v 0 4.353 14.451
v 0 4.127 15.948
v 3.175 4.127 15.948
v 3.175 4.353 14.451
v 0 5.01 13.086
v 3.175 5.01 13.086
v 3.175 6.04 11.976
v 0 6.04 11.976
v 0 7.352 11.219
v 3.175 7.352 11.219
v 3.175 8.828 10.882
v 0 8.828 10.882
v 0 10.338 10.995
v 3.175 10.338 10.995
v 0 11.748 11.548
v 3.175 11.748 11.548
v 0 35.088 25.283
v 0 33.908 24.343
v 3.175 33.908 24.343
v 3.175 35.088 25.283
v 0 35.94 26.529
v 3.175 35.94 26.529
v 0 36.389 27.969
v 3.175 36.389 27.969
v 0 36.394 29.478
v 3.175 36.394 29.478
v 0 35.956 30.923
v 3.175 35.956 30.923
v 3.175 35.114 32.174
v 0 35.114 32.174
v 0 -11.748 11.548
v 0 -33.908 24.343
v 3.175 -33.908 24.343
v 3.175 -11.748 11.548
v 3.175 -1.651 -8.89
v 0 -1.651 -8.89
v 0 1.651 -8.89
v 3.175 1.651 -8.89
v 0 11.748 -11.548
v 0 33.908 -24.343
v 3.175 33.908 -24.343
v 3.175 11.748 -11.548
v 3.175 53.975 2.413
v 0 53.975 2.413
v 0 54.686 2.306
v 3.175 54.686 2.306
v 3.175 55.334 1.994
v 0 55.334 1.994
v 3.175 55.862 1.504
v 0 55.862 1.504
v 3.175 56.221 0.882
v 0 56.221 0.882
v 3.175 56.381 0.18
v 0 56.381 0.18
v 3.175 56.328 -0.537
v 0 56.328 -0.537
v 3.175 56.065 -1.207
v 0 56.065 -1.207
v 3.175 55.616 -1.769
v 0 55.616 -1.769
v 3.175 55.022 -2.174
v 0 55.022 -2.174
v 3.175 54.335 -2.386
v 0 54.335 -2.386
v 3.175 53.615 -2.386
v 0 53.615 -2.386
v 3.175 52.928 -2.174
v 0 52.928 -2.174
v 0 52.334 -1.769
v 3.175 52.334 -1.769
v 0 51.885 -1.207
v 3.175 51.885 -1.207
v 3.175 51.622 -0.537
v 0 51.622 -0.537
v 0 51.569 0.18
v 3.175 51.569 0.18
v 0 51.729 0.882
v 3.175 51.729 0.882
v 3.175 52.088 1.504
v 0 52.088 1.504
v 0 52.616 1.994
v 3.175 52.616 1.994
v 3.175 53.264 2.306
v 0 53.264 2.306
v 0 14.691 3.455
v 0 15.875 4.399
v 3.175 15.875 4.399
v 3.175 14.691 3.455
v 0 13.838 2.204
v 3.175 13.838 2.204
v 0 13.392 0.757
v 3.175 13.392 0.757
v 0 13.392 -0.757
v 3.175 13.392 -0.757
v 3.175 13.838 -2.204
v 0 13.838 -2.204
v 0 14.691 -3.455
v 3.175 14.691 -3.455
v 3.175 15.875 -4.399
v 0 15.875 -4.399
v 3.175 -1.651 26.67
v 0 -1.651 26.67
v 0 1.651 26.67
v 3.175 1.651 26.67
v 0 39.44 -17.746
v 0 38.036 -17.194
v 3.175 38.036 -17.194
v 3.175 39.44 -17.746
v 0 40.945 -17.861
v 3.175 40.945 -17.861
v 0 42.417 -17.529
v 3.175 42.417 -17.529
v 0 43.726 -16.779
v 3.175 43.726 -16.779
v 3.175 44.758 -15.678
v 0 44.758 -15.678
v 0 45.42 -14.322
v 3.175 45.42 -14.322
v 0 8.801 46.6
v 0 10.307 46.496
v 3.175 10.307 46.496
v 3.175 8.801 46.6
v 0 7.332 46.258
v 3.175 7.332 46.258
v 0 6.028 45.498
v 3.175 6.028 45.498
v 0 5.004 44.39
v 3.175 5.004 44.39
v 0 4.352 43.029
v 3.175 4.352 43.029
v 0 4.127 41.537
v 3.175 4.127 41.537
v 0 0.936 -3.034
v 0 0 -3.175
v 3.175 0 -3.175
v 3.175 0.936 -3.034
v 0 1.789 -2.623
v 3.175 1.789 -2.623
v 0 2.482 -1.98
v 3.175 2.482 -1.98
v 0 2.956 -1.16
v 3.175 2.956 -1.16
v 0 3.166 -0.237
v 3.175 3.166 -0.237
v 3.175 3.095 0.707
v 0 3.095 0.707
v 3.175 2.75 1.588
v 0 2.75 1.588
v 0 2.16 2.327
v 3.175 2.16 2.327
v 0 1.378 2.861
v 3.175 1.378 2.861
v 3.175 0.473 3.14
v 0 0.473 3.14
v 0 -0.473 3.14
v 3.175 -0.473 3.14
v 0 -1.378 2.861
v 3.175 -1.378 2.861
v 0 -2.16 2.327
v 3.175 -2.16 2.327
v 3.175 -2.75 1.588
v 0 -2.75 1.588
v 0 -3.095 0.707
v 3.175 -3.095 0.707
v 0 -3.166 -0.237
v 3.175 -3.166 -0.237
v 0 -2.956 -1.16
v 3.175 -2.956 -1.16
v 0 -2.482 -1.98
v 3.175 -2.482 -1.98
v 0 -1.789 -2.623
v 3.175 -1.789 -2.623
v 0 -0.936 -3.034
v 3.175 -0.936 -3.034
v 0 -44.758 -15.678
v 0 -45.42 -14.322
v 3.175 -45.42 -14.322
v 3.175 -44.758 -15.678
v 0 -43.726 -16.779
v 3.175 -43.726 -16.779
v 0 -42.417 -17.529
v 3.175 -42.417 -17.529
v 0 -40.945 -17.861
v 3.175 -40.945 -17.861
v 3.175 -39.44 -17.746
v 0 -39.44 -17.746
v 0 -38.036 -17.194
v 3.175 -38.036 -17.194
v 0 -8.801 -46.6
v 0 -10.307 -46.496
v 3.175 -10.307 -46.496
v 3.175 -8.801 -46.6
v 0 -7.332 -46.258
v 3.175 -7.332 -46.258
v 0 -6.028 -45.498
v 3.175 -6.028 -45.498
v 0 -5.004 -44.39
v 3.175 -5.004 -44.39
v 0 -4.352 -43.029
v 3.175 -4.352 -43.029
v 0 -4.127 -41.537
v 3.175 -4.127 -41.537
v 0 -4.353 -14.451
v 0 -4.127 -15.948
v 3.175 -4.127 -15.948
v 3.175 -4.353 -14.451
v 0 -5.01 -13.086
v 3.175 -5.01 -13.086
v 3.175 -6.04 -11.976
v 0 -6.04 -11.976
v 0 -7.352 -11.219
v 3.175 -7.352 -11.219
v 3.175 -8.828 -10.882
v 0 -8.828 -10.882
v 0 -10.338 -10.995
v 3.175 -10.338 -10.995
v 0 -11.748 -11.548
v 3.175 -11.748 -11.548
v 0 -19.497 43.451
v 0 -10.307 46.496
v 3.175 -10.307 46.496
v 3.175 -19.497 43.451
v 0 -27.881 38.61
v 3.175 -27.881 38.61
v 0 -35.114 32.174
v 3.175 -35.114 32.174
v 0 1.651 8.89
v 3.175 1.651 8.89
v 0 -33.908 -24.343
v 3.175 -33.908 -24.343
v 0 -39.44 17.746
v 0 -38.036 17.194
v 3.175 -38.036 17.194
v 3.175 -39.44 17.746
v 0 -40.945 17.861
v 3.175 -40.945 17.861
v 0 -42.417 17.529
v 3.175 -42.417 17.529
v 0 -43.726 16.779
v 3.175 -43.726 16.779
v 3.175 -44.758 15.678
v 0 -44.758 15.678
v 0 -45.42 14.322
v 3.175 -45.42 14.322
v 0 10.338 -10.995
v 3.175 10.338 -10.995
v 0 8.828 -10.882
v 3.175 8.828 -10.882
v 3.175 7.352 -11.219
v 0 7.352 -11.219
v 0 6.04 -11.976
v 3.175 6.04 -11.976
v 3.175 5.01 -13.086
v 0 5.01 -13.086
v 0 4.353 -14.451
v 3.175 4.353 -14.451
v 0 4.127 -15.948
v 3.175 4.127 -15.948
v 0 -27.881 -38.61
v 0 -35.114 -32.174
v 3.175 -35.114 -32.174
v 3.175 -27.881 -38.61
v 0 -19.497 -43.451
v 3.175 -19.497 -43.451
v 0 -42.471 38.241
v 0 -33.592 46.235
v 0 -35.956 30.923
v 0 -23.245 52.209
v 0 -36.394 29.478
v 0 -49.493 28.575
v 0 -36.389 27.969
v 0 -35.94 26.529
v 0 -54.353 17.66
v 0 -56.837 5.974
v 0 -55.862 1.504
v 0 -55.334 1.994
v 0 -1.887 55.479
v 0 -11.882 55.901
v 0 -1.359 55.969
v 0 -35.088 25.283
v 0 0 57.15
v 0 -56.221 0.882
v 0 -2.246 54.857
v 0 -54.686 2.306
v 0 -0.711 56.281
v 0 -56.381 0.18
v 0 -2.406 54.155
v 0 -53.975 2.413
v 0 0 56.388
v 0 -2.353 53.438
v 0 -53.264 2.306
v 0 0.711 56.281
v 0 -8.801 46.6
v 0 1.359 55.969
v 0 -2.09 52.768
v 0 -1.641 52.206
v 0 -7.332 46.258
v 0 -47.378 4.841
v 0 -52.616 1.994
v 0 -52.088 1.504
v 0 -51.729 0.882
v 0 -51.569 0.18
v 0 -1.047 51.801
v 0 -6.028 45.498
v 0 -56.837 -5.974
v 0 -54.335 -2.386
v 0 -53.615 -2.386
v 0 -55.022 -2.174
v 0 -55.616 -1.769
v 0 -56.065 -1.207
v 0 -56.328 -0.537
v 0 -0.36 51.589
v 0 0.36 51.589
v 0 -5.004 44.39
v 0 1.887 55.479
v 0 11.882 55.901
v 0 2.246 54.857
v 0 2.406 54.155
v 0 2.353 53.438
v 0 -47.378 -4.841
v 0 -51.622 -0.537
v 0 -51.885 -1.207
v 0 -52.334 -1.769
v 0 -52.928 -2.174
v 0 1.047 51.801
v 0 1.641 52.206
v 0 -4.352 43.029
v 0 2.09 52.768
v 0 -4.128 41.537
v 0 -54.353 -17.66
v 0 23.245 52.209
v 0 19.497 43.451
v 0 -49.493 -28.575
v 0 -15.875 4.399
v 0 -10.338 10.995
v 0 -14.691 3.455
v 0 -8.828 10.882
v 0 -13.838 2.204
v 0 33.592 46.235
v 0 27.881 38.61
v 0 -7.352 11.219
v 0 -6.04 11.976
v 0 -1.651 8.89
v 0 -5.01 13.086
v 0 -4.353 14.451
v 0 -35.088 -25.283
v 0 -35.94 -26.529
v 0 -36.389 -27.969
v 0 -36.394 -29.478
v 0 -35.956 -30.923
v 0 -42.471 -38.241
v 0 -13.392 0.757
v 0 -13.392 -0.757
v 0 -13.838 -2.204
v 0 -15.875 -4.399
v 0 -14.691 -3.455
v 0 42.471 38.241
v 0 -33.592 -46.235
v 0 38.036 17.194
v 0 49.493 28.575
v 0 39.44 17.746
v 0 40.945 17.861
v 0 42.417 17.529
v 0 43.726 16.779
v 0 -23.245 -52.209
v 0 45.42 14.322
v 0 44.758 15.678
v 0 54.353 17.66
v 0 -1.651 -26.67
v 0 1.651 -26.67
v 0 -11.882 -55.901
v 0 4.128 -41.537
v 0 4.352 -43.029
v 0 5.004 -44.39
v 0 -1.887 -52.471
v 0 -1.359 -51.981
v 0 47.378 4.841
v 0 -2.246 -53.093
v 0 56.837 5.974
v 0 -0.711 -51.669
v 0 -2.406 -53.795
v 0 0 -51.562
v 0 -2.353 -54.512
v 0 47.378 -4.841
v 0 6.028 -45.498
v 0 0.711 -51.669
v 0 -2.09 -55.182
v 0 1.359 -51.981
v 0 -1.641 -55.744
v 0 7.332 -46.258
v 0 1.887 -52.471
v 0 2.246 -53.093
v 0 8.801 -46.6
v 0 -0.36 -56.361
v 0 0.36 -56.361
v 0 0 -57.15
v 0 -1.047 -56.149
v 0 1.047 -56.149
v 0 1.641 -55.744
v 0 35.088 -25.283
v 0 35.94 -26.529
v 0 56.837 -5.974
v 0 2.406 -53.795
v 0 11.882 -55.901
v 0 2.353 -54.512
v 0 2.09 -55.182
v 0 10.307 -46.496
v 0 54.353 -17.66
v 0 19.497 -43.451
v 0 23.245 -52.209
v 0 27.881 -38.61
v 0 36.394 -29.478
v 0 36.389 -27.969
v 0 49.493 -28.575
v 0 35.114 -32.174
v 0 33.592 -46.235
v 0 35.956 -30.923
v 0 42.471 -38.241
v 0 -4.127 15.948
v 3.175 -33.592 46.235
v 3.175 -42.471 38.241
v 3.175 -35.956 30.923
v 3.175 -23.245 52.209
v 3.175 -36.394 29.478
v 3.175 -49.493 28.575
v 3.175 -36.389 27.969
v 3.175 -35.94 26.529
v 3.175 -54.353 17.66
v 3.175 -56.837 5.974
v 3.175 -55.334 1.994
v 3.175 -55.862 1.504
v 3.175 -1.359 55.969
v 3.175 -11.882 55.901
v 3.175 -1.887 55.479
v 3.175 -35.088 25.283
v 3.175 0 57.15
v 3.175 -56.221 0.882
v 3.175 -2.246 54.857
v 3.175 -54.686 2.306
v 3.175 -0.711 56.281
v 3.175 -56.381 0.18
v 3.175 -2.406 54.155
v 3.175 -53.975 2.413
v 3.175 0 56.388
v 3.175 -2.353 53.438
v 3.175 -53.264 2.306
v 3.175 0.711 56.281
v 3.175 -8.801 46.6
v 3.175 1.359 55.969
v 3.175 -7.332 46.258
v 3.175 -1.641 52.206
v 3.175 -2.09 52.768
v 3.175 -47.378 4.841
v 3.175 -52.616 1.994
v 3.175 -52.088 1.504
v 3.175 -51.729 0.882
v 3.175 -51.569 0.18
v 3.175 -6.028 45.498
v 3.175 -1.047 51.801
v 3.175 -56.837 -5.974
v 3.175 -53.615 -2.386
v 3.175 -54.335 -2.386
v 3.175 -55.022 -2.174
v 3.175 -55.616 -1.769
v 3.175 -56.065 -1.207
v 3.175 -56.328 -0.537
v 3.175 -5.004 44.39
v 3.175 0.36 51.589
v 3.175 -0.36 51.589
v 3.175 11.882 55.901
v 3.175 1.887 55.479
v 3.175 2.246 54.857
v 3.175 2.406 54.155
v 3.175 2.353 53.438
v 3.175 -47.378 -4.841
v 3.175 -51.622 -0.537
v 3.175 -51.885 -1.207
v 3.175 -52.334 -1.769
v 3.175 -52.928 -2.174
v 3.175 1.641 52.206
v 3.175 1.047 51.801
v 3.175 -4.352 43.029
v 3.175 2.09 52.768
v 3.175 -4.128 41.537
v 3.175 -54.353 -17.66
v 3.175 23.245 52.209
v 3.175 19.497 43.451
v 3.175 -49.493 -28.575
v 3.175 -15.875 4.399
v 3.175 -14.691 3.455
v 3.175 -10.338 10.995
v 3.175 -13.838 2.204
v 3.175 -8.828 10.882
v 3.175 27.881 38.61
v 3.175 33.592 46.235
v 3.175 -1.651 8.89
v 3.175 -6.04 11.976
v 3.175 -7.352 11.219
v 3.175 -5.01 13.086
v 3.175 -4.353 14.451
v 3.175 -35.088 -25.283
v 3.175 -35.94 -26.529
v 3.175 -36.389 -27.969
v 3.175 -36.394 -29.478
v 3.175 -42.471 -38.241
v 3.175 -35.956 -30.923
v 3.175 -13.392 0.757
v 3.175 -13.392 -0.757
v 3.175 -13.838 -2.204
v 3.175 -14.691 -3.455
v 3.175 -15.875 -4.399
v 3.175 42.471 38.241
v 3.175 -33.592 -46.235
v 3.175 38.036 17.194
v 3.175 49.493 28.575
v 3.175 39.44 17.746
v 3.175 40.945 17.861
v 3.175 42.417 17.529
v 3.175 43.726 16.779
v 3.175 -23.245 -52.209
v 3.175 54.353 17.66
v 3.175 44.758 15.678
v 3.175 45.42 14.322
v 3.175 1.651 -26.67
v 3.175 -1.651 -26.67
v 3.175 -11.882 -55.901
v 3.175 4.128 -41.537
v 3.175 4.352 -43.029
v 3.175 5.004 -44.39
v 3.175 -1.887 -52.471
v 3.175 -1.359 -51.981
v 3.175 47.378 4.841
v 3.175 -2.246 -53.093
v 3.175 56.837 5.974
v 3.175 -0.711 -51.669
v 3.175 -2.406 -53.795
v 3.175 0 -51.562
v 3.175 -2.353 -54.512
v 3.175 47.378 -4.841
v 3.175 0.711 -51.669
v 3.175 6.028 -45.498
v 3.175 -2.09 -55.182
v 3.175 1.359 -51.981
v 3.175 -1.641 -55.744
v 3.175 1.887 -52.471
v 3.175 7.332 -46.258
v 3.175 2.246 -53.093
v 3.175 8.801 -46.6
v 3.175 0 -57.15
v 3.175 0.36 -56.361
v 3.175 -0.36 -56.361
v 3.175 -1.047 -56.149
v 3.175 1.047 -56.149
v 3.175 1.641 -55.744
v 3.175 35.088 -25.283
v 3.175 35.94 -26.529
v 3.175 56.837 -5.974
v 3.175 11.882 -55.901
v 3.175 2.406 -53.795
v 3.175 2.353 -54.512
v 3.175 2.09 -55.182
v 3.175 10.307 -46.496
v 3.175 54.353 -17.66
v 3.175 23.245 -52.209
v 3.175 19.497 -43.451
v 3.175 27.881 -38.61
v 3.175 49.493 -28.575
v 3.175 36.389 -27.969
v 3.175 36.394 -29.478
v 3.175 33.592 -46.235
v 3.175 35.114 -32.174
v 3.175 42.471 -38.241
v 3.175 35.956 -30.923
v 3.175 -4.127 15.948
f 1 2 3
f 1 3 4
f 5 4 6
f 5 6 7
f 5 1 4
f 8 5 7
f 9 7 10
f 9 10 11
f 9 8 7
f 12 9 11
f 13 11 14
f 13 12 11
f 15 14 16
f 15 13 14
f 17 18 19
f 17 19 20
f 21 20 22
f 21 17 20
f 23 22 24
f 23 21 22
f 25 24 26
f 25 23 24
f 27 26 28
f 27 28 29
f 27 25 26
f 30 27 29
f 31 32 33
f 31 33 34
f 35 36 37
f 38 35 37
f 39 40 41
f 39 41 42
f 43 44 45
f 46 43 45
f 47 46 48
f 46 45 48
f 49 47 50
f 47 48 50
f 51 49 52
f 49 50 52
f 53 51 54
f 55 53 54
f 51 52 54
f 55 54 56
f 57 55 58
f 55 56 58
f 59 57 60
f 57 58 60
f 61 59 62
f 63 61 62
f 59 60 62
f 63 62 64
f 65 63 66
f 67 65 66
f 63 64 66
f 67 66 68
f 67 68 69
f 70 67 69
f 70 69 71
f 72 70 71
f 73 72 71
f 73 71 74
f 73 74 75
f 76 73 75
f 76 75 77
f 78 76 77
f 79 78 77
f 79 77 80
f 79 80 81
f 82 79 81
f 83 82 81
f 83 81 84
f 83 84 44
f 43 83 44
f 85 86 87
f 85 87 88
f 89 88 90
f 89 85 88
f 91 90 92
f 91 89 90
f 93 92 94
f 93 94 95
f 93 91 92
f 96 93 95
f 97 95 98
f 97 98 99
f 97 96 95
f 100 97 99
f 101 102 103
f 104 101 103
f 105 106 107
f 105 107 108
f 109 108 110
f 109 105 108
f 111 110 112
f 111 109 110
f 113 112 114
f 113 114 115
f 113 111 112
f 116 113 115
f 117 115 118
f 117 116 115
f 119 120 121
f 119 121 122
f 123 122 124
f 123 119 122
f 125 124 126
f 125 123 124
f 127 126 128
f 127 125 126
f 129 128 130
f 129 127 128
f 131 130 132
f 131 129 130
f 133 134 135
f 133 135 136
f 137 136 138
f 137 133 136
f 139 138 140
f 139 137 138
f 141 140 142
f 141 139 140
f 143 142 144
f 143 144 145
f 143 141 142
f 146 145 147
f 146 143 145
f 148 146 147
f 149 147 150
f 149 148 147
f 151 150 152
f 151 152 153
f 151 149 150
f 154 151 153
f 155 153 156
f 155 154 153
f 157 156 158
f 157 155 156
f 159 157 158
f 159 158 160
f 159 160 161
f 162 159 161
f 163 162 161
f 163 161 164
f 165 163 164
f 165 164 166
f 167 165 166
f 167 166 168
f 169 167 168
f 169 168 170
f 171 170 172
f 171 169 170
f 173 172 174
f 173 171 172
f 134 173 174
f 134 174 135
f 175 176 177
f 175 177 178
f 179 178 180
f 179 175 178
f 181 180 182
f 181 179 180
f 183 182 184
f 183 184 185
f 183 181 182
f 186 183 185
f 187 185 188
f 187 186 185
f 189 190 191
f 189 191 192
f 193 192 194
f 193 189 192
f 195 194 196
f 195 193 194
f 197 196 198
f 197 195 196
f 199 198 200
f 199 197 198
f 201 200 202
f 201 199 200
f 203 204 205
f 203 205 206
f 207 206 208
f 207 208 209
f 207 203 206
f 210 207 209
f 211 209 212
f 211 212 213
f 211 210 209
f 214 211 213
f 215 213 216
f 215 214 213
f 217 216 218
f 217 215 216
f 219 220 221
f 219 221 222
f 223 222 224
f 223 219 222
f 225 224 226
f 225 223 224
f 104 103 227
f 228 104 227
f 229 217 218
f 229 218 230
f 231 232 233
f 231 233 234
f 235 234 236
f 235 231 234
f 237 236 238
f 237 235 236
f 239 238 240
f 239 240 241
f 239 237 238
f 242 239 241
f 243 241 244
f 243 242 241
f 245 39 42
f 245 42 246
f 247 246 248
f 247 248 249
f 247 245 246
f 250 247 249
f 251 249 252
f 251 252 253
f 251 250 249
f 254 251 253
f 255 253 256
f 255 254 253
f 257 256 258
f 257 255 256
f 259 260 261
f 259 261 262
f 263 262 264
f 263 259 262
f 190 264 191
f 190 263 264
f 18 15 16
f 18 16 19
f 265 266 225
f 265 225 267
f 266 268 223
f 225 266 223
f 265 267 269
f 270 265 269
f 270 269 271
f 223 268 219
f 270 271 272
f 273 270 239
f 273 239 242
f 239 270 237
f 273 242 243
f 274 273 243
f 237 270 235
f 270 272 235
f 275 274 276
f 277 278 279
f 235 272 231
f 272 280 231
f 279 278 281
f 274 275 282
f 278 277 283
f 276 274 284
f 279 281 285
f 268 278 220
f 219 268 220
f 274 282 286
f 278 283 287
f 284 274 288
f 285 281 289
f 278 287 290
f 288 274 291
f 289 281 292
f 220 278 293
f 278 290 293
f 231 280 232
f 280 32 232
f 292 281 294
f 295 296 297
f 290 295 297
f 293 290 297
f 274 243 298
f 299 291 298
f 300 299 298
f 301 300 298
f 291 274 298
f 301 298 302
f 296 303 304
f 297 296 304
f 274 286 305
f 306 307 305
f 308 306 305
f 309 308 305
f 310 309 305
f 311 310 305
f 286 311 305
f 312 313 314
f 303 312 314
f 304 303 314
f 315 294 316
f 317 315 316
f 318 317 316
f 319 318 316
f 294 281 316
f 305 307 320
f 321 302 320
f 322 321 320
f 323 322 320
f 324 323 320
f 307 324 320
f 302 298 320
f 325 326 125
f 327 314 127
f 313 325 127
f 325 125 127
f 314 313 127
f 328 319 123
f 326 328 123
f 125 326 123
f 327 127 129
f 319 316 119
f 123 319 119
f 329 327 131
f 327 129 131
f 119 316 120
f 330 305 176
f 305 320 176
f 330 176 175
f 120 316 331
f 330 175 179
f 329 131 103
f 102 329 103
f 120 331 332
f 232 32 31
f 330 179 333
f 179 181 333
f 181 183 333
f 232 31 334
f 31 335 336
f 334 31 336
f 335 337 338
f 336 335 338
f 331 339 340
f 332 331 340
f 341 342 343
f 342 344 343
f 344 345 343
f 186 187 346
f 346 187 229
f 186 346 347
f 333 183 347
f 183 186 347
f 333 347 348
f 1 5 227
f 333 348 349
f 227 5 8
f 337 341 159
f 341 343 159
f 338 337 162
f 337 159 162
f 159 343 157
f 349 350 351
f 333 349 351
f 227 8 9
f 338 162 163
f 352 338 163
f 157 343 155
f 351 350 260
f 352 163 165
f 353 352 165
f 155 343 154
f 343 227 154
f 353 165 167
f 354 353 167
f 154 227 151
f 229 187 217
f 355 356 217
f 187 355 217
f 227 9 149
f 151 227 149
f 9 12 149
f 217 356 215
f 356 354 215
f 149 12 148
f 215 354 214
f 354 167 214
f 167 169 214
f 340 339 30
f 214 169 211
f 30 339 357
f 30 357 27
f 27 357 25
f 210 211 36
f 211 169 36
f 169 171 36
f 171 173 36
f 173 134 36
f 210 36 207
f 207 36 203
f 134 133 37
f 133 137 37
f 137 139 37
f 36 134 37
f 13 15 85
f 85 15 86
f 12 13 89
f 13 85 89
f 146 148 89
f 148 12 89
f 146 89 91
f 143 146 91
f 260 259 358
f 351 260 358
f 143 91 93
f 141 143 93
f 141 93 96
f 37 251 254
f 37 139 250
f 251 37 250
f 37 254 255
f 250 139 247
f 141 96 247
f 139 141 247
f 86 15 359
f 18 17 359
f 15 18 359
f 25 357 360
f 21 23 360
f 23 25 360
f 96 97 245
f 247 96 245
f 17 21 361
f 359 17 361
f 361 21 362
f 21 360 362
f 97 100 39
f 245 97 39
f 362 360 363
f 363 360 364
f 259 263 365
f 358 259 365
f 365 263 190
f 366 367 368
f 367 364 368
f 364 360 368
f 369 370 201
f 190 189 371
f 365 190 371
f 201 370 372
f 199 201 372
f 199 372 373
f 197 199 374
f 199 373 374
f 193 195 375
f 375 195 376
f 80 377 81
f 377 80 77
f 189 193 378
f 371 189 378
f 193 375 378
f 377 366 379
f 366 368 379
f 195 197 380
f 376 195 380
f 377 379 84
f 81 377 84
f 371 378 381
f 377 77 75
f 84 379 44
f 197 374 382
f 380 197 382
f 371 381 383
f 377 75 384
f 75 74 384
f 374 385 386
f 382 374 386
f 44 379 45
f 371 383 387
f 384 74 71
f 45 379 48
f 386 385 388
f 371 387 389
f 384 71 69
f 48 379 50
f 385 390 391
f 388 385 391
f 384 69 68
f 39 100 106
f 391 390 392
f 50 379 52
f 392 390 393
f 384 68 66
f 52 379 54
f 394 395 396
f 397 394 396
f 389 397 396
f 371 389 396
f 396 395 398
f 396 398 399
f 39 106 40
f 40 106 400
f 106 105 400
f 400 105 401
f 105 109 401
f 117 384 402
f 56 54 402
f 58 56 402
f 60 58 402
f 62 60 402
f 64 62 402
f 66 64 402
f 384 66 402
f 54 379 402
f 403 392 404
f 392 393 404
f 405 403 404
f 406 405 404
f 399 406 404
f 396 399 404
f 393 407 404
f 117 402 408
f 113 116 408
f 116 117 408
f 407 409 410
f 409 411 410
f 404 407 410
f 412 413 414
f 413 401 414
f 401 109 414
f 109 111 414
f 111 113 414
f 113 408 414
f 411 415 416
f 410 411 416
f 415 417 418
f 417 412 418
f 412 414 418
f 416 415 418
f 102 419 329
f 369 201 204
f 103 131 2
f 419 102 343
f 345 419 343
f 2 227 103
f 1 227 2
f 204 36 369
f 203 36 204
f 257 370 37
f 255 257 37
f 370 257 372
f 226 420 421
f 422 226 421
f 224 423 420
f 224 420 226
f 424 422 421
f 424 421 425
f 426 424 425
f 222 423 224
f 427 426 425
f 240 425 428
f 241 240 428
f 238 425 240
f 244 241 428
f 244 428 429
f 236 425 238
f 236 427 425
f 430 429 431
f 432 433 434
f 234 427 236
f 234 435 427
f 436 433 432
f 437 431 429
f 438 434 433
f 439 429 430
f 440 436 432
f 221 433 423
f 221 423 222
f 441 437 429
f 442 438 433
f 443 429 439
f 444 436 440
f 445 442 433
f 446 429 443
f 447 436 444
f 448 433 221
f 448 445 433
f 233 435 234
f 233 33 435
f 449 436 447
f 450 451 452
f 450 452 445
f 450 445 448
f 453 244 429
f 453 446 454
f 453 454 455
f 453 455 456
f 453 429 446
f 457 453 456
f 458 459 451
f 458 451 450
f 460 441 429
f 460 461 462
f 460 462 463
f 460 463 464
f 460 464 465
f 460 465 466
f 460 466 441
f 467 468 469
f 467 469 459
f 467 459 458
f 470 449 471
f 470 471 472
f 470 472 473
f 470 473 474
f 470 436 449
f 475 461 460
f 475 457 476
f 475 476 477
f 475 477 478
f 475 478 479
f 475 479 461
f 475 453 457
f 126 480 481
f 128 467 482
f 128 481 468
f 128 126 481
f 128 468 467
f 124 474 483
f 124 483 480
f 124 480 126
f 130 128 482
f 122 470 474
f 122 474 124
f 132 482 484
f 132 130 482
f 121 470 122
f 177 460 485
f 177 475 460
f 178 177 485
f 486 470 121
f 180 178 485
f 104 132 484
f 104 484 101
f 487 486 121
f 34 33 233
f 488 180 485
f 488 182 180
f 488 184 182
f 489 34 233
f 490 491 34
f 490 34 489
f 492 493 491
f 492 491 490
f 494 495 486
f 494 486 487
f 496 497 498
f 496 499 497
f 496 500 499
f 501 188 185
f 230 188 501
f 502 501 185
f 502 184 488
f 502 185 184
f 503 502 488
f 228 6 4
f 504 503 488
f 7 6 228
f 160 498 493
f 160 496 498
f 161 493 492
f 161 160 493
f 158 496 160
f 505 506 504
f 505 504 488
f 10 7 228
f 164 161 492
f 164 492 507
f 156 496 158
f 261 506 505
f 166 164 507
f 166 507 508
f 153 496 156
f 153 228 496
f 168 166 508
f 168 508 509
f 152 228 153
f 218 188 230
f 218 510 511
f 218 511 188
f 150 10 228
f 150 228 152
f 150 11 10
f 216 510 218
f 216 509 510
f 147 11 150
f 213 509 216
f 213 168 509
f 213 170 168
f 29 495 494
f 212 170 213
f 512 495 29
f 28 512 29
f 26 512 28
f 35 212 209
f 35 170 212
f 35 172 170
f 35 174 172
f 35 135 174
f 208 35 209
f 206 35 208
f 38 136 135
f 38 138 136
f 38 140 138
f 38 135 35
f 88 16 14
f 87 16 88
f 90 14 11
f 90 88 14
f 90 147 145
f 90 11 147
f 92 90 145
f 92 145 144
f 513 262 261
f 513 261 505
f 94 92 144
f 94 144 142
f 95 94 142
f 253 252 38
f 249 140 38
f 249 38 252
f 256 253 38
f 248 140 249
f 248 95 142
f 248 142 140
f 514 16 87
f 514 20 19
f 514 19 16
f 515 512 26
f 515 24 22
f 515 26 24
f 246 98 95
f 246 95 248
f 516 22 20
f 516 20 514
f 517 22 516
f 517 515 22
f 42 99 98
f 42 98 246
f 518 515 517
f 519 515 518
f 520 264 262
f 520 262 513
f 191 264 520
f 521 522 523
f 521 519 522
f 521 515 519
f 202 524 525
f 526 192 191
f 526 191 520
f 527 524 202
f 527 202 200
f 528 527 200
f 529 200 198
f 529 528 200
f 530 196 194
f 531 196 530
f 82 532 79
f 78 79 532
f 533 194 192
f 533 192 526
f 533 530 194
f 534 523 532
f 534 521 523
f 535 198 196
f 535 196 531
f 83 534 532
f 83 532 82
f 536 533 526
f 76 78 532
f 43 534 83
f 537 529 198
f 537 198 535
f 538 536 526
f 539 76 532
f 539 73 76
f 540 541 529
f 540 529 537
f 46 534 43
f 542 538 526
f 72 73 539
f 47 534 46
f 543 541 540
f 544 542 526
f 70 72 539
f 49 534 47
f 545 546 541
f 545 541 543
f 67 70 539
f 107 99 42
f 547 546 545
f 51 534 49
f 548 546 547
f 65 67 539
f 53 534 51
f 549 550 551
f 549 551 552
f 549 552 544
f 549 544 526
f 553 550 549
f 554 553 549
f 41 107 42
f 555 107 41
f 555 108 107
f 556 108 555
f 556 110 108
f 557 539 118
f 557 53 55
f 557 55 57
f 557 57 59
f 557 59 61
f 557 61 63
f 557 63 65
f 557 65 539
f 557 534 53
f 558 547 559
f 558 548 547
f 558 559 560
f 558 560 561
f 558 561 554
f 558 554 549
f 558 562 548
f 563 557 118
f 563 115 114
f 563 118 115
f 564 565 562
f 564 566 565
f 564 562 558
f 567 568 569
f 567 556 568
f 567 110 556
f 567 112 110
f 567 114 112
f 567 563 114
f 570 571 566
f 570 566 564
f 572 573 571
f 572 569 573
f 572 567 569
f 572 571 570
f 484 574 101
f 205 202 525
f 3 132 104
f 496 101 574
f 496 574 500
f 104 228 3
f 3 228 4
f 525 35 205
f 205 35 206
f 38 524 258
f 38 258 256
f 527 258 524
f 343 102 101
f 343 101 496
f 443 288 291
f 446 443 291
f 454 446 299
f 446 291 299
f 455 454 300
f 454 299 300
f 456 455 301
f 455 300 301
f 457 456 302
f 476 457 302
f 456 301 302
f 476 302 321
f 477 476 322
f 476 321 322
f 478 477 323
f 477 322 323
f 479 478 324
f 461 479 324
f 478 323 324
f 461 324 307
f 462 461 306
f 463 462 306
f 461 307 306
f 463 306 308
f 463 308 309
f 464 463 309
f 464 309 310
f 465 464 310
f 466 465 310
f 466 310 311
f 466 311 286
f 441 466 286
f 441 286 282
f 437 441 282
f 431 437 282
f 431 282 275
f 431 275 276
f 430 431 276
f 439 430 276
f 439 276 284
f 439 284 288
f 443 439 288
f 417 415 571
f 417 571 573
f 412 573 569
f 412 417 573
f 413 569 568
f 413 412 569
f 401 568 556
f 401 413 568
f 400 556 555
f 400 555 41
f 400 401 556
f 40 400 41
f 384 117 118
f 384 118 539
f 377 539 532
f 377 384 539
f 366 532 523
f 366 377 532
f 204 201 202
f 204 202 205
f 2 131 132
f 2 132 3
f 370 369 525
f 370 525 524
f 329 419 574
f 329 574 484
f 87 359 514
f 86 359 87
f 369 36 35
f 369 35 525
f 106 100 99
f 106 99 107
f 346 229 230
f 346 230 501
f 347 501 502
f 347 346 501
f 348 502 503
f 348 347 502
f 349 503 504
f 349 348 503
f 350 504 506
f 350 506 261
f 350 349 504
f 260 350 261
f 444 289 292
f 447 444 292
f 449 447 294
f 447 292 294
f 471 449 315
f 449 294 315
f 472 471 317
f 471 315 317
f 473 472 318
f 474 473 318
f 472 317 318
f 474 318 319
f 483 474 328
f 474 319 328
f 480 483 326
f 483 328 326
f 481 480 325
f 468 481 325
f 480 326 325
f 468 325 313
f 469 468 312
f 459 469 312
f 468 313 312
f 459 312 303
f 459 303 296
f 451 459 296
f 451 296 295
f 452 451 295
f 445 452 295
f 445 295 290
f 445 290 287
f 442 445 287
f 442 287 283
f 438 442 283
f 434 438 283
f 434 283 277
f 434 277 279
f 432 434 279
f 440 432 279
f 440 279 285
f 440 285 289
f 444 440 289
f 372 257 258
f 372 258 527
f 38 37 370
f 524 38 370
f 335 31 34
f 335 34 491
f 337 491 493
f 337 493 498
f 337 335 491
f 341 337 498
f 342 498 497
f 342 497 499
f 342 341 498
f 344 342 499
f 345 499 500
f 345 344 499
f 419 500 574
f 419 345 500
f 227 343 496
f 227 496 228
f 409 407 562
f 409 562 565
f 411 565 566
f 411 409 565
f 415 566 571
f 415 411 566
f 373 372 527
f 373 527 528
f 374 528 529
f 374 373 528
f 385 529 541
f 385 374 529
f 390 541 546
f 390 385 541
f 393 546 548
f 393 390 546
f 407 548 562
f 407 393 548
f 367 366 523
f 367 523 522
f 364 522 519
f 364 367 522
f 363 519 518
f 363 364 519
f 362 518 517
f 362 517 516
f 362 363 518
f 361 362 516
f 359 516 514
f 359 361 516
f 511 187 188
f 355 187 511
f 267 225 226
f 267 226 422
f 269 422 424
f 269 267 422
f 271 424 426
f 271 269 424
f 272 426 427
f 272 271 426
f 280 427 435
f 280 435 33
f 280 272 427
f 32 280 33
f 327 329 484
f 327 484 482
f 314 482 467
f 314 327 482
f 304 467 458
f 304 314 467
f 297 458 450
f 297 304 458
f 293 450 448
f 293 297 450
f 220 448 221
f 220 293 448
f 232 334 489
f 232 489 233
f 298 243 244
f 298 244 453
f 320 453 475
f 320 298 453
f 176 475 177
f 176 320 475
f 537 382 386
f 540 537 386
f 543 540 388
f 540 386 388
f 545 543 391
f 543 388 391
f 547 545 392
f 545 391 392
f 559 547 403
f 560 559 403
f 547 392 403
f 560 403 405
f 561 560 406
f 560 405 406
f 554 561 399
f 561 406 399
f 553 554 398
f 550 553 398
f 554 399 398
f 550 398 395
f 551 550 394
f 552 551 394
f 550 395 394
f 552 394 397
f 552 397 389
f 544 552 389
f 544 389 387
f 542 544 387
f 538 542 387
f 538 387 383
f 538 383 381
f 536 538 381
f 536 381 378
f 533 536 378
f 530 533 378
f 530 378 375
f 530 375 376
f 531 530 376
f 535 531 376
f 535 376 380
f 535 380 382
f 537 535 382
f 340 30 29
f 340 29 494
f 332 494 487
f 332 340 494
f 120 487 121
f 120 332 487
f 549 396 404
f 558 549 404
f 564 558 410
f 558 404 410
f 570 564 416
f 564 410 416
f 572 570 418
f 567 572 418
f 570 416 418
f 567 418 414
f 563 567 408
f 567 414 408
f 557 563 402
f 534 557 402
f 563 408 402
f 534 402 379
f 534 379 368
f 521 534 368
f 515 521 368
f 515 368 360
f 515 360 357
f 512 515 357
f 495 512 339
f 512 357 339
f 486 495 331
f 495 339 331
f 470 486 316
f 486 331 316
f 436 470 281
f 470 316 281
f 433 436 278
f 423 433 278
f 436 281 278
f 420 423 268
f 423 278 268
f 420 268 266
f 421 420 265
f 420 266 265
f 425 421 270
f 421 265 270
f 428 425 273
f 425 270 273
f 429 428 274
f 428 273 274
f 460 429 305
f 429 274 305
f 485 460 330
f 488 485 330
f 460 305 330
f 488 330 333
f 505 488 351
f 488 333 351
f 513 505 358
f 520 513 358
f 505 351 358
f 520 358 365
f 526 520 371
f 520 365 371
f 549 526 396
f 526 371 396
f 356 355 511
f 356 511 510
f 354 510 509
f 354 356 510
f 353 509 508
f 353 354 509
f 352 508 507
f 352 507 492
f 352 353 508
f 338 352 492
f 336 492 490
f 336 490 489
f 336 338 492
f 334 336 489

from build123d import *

# Parameters (mm, degrees)
SKETCH1_R              = 57.15
SKETCH1_W              = 17.78
SKETCH1_H              = 3.302
BOSS_EXTRUDE1_DEPTH    = 3.175
CUT_EXTRUDE1_START     = -3.175
CUT_EXTRUDE1_OUTLINE_R = 3.175
CUT_EXTRUDE1_DEPTH     = 3.175
F_10_24_TAPPED_HOLE1_D = 4.826


# Read off the part's stored shape, not the designer's step: Cut-Extrude1
with BuildPart() as part:
    # Sketch1 → Boss-Extrude1 (new body)
    with BuildSketch(Plane(origin=(0, 0, 0), x_dir=(0, 0, -1), z_dir=(1, 0, 0))):
        Circle(SKETCH1_R)
        with Locations((-17.78, 0)):
            Rectangle(SKETCH1_W, SKETCH1_H, mode=Mode.SUBTRACT)
        with Locations((17.78, 0)):
            Rectangle(SKETCH1_W, SKETCH1_H, mode=Mode.SUBTRACT)
    extrude(amount=BOSS_EXTRUDE1_DEPTH)

    # Cut-Extrude1 outline → Cut-Extrude1 (cut)
    with BuildSketch(Plane(origin=(3.175, 0, 0), x_dir=(0, 0, -1), z_dir=(1, 0, 0)).offset(CUT_EXTRUDE1_START)):
        with BuildLine():
            Line((-17.193839306, 38.035603254), (-4.399409051, 15.875))
            ThreePointArc((-4.399409051, 15.875), (0, 13.335), (4.399409051, 15.875))
            Line((4.399409051, 15.875), (17.193839306, 38.035603254))
            ThreePointArc((17.193839306, 38.035603254), (17.529050695, 42.416735863), (14.322123419, 45.420451404))
            ThreePointArc((14.322123419, 45.420451404), (0, 47.625), (-14.322123419, 45.420451404))
            ThreePointArc((-14.322123419, 45.420451404), (-17.529050695, 42.416735863), (-17.193839306, 38.035603254))
        make_face()
        with BuildLine():
            ThreePointArc((15.947857811, -4.1275), (11.548448759, -6.6675), (11.548448759, -11.7475))
            Line((11.548448759, -11.7475), (24.342879014, -33.908103254))
            ThreePointArc((24.342879014, -33.908103254), (27.969445455, -36.388971138), (32.174203058, -35.113548419))
            ThreePointArc((32.174203058, -35.113548419), (41.244459855, -23.8125), (46.496326477, -10.306902985))
            ThreePointArc((46.496326477, -10.306902985), (45.49849615, -6.027764725), (41.536718319, -4.1275))
            Line((41.536718319, -4.1275), (15.947857811, -4.1275))
        make_face()
        with BuildLine():
            ThreePointArc((-24.342879014, 33.908103254), (-27.969445455, 36.388971138), (-32.174203058, 35.113548419))
            ThreePointArc((-32.174203058, 35.113548419), (-41.244459855, 23.8125), (-46.496326477, 10.306902985))
            ThreePointArc((-46.496326477, 10.306902985), (-45.49849615, 6.027764725), (-41.536718319, 4.1275))
            Line((-41.536718319, 4.1275), (-15.947857811, 4.1275))
            ThreePointArc((-15.947857811, 4.1275), (-11.548448759, 6.6675), (-11.548448759, 11.7475))
            Line((-11.548448759, 11.7475), (-24.342879014, 33.908103254))
        make_face()
        with BuildLine():
            ThreePointArc((-41.536718319, -4.1275), (-45.49849615, -6.027764725), (-46.496326477, -10.306902985))
            ThreePointArc((-46.496326477, -10.306902985), (-41.244459855, -23.8125), (-32.174203058, -35.113548419))
            ThreePointArc((-32.174203058, -35.113548419), (-27.969445455, -36.388971138), (-24.342879014, -33.908103254))
            Line((-24.342879014, -33.908103254), (-11.548448759, -11.7475))
            ThreePointArc((-11.548448759, -11.7475), (-11.548448759, -6.6675), (-15.947857811, -4.1275))
            Line((-15.947857811, -4.1275), (-41.536718319, -4.1275))
        make_face()
        with BuildLine():
            ThreePointArc((-17.193839306, -38.035603254), (-17.529050695, -42.416735863), (-14.322123419, -45.420451404))
            ThreePointArc((-14.322123419, -45.420451404), (0, -47.625), (14.322123419, -45.420451404))
            ThreePointArc((14.322123419, -45.420451404), (17.529050695, -42.416735863), (17.193839306, -38.035603254))
            Line((17.193839306, -38.035603254), (4.399409051, -15.875))
            ThreePointArc((4.399409051, -15.875), (0, -13.335), (-4.399409051, -15.875))
            Line((-4.399409051, -15.875), (-17.193839306, -38.035603254))
        make_face()
        with BuildLine():
            ThreePointArc((41.536718319, 4.1275), (45.49849615, 6.027764725), (46.496326477, 10.306902985))
            ThreePointArc((46.496326477, 10.306902985), (41.244459855, 23.8125), (32.174203058, 35.113548419))
            ThreePointArc((32.174203058, 35.113548419), (27.969445455, 36.388971138), (24.342879014, 33.908103254))
            Line((24.342879014, 33.908103254), (11.548448759, 11.7475))
            ThreePointArc((11.548448759, 11.7475), (11.548448759, 6.6675), (15.947857811, 4.1275))
            Line((15.947857811, 4.1275), (41.536718319, 4.1275))
        make_face()
        Circle(CUT_EXTRUDE1_OUTLINE_R)
    extrude(amount=CUT_EXTRUDE1_DEPTH, mode=Mode.SUBTRACT)

    # #10-24 Tapped Hole1 (through all)
    with Locations(Plane(origin=(3.175, 0, 0), x_dir=(0, 0, -1), z_dir=(1, 0, 0))):
        with Locations((-53.975, 0), (0, 53.975), (53.975, 0), (0, -53.975)):
            Hole(F_10_24_TAPPED_HOLE1_D / 2)


solid = part.part
